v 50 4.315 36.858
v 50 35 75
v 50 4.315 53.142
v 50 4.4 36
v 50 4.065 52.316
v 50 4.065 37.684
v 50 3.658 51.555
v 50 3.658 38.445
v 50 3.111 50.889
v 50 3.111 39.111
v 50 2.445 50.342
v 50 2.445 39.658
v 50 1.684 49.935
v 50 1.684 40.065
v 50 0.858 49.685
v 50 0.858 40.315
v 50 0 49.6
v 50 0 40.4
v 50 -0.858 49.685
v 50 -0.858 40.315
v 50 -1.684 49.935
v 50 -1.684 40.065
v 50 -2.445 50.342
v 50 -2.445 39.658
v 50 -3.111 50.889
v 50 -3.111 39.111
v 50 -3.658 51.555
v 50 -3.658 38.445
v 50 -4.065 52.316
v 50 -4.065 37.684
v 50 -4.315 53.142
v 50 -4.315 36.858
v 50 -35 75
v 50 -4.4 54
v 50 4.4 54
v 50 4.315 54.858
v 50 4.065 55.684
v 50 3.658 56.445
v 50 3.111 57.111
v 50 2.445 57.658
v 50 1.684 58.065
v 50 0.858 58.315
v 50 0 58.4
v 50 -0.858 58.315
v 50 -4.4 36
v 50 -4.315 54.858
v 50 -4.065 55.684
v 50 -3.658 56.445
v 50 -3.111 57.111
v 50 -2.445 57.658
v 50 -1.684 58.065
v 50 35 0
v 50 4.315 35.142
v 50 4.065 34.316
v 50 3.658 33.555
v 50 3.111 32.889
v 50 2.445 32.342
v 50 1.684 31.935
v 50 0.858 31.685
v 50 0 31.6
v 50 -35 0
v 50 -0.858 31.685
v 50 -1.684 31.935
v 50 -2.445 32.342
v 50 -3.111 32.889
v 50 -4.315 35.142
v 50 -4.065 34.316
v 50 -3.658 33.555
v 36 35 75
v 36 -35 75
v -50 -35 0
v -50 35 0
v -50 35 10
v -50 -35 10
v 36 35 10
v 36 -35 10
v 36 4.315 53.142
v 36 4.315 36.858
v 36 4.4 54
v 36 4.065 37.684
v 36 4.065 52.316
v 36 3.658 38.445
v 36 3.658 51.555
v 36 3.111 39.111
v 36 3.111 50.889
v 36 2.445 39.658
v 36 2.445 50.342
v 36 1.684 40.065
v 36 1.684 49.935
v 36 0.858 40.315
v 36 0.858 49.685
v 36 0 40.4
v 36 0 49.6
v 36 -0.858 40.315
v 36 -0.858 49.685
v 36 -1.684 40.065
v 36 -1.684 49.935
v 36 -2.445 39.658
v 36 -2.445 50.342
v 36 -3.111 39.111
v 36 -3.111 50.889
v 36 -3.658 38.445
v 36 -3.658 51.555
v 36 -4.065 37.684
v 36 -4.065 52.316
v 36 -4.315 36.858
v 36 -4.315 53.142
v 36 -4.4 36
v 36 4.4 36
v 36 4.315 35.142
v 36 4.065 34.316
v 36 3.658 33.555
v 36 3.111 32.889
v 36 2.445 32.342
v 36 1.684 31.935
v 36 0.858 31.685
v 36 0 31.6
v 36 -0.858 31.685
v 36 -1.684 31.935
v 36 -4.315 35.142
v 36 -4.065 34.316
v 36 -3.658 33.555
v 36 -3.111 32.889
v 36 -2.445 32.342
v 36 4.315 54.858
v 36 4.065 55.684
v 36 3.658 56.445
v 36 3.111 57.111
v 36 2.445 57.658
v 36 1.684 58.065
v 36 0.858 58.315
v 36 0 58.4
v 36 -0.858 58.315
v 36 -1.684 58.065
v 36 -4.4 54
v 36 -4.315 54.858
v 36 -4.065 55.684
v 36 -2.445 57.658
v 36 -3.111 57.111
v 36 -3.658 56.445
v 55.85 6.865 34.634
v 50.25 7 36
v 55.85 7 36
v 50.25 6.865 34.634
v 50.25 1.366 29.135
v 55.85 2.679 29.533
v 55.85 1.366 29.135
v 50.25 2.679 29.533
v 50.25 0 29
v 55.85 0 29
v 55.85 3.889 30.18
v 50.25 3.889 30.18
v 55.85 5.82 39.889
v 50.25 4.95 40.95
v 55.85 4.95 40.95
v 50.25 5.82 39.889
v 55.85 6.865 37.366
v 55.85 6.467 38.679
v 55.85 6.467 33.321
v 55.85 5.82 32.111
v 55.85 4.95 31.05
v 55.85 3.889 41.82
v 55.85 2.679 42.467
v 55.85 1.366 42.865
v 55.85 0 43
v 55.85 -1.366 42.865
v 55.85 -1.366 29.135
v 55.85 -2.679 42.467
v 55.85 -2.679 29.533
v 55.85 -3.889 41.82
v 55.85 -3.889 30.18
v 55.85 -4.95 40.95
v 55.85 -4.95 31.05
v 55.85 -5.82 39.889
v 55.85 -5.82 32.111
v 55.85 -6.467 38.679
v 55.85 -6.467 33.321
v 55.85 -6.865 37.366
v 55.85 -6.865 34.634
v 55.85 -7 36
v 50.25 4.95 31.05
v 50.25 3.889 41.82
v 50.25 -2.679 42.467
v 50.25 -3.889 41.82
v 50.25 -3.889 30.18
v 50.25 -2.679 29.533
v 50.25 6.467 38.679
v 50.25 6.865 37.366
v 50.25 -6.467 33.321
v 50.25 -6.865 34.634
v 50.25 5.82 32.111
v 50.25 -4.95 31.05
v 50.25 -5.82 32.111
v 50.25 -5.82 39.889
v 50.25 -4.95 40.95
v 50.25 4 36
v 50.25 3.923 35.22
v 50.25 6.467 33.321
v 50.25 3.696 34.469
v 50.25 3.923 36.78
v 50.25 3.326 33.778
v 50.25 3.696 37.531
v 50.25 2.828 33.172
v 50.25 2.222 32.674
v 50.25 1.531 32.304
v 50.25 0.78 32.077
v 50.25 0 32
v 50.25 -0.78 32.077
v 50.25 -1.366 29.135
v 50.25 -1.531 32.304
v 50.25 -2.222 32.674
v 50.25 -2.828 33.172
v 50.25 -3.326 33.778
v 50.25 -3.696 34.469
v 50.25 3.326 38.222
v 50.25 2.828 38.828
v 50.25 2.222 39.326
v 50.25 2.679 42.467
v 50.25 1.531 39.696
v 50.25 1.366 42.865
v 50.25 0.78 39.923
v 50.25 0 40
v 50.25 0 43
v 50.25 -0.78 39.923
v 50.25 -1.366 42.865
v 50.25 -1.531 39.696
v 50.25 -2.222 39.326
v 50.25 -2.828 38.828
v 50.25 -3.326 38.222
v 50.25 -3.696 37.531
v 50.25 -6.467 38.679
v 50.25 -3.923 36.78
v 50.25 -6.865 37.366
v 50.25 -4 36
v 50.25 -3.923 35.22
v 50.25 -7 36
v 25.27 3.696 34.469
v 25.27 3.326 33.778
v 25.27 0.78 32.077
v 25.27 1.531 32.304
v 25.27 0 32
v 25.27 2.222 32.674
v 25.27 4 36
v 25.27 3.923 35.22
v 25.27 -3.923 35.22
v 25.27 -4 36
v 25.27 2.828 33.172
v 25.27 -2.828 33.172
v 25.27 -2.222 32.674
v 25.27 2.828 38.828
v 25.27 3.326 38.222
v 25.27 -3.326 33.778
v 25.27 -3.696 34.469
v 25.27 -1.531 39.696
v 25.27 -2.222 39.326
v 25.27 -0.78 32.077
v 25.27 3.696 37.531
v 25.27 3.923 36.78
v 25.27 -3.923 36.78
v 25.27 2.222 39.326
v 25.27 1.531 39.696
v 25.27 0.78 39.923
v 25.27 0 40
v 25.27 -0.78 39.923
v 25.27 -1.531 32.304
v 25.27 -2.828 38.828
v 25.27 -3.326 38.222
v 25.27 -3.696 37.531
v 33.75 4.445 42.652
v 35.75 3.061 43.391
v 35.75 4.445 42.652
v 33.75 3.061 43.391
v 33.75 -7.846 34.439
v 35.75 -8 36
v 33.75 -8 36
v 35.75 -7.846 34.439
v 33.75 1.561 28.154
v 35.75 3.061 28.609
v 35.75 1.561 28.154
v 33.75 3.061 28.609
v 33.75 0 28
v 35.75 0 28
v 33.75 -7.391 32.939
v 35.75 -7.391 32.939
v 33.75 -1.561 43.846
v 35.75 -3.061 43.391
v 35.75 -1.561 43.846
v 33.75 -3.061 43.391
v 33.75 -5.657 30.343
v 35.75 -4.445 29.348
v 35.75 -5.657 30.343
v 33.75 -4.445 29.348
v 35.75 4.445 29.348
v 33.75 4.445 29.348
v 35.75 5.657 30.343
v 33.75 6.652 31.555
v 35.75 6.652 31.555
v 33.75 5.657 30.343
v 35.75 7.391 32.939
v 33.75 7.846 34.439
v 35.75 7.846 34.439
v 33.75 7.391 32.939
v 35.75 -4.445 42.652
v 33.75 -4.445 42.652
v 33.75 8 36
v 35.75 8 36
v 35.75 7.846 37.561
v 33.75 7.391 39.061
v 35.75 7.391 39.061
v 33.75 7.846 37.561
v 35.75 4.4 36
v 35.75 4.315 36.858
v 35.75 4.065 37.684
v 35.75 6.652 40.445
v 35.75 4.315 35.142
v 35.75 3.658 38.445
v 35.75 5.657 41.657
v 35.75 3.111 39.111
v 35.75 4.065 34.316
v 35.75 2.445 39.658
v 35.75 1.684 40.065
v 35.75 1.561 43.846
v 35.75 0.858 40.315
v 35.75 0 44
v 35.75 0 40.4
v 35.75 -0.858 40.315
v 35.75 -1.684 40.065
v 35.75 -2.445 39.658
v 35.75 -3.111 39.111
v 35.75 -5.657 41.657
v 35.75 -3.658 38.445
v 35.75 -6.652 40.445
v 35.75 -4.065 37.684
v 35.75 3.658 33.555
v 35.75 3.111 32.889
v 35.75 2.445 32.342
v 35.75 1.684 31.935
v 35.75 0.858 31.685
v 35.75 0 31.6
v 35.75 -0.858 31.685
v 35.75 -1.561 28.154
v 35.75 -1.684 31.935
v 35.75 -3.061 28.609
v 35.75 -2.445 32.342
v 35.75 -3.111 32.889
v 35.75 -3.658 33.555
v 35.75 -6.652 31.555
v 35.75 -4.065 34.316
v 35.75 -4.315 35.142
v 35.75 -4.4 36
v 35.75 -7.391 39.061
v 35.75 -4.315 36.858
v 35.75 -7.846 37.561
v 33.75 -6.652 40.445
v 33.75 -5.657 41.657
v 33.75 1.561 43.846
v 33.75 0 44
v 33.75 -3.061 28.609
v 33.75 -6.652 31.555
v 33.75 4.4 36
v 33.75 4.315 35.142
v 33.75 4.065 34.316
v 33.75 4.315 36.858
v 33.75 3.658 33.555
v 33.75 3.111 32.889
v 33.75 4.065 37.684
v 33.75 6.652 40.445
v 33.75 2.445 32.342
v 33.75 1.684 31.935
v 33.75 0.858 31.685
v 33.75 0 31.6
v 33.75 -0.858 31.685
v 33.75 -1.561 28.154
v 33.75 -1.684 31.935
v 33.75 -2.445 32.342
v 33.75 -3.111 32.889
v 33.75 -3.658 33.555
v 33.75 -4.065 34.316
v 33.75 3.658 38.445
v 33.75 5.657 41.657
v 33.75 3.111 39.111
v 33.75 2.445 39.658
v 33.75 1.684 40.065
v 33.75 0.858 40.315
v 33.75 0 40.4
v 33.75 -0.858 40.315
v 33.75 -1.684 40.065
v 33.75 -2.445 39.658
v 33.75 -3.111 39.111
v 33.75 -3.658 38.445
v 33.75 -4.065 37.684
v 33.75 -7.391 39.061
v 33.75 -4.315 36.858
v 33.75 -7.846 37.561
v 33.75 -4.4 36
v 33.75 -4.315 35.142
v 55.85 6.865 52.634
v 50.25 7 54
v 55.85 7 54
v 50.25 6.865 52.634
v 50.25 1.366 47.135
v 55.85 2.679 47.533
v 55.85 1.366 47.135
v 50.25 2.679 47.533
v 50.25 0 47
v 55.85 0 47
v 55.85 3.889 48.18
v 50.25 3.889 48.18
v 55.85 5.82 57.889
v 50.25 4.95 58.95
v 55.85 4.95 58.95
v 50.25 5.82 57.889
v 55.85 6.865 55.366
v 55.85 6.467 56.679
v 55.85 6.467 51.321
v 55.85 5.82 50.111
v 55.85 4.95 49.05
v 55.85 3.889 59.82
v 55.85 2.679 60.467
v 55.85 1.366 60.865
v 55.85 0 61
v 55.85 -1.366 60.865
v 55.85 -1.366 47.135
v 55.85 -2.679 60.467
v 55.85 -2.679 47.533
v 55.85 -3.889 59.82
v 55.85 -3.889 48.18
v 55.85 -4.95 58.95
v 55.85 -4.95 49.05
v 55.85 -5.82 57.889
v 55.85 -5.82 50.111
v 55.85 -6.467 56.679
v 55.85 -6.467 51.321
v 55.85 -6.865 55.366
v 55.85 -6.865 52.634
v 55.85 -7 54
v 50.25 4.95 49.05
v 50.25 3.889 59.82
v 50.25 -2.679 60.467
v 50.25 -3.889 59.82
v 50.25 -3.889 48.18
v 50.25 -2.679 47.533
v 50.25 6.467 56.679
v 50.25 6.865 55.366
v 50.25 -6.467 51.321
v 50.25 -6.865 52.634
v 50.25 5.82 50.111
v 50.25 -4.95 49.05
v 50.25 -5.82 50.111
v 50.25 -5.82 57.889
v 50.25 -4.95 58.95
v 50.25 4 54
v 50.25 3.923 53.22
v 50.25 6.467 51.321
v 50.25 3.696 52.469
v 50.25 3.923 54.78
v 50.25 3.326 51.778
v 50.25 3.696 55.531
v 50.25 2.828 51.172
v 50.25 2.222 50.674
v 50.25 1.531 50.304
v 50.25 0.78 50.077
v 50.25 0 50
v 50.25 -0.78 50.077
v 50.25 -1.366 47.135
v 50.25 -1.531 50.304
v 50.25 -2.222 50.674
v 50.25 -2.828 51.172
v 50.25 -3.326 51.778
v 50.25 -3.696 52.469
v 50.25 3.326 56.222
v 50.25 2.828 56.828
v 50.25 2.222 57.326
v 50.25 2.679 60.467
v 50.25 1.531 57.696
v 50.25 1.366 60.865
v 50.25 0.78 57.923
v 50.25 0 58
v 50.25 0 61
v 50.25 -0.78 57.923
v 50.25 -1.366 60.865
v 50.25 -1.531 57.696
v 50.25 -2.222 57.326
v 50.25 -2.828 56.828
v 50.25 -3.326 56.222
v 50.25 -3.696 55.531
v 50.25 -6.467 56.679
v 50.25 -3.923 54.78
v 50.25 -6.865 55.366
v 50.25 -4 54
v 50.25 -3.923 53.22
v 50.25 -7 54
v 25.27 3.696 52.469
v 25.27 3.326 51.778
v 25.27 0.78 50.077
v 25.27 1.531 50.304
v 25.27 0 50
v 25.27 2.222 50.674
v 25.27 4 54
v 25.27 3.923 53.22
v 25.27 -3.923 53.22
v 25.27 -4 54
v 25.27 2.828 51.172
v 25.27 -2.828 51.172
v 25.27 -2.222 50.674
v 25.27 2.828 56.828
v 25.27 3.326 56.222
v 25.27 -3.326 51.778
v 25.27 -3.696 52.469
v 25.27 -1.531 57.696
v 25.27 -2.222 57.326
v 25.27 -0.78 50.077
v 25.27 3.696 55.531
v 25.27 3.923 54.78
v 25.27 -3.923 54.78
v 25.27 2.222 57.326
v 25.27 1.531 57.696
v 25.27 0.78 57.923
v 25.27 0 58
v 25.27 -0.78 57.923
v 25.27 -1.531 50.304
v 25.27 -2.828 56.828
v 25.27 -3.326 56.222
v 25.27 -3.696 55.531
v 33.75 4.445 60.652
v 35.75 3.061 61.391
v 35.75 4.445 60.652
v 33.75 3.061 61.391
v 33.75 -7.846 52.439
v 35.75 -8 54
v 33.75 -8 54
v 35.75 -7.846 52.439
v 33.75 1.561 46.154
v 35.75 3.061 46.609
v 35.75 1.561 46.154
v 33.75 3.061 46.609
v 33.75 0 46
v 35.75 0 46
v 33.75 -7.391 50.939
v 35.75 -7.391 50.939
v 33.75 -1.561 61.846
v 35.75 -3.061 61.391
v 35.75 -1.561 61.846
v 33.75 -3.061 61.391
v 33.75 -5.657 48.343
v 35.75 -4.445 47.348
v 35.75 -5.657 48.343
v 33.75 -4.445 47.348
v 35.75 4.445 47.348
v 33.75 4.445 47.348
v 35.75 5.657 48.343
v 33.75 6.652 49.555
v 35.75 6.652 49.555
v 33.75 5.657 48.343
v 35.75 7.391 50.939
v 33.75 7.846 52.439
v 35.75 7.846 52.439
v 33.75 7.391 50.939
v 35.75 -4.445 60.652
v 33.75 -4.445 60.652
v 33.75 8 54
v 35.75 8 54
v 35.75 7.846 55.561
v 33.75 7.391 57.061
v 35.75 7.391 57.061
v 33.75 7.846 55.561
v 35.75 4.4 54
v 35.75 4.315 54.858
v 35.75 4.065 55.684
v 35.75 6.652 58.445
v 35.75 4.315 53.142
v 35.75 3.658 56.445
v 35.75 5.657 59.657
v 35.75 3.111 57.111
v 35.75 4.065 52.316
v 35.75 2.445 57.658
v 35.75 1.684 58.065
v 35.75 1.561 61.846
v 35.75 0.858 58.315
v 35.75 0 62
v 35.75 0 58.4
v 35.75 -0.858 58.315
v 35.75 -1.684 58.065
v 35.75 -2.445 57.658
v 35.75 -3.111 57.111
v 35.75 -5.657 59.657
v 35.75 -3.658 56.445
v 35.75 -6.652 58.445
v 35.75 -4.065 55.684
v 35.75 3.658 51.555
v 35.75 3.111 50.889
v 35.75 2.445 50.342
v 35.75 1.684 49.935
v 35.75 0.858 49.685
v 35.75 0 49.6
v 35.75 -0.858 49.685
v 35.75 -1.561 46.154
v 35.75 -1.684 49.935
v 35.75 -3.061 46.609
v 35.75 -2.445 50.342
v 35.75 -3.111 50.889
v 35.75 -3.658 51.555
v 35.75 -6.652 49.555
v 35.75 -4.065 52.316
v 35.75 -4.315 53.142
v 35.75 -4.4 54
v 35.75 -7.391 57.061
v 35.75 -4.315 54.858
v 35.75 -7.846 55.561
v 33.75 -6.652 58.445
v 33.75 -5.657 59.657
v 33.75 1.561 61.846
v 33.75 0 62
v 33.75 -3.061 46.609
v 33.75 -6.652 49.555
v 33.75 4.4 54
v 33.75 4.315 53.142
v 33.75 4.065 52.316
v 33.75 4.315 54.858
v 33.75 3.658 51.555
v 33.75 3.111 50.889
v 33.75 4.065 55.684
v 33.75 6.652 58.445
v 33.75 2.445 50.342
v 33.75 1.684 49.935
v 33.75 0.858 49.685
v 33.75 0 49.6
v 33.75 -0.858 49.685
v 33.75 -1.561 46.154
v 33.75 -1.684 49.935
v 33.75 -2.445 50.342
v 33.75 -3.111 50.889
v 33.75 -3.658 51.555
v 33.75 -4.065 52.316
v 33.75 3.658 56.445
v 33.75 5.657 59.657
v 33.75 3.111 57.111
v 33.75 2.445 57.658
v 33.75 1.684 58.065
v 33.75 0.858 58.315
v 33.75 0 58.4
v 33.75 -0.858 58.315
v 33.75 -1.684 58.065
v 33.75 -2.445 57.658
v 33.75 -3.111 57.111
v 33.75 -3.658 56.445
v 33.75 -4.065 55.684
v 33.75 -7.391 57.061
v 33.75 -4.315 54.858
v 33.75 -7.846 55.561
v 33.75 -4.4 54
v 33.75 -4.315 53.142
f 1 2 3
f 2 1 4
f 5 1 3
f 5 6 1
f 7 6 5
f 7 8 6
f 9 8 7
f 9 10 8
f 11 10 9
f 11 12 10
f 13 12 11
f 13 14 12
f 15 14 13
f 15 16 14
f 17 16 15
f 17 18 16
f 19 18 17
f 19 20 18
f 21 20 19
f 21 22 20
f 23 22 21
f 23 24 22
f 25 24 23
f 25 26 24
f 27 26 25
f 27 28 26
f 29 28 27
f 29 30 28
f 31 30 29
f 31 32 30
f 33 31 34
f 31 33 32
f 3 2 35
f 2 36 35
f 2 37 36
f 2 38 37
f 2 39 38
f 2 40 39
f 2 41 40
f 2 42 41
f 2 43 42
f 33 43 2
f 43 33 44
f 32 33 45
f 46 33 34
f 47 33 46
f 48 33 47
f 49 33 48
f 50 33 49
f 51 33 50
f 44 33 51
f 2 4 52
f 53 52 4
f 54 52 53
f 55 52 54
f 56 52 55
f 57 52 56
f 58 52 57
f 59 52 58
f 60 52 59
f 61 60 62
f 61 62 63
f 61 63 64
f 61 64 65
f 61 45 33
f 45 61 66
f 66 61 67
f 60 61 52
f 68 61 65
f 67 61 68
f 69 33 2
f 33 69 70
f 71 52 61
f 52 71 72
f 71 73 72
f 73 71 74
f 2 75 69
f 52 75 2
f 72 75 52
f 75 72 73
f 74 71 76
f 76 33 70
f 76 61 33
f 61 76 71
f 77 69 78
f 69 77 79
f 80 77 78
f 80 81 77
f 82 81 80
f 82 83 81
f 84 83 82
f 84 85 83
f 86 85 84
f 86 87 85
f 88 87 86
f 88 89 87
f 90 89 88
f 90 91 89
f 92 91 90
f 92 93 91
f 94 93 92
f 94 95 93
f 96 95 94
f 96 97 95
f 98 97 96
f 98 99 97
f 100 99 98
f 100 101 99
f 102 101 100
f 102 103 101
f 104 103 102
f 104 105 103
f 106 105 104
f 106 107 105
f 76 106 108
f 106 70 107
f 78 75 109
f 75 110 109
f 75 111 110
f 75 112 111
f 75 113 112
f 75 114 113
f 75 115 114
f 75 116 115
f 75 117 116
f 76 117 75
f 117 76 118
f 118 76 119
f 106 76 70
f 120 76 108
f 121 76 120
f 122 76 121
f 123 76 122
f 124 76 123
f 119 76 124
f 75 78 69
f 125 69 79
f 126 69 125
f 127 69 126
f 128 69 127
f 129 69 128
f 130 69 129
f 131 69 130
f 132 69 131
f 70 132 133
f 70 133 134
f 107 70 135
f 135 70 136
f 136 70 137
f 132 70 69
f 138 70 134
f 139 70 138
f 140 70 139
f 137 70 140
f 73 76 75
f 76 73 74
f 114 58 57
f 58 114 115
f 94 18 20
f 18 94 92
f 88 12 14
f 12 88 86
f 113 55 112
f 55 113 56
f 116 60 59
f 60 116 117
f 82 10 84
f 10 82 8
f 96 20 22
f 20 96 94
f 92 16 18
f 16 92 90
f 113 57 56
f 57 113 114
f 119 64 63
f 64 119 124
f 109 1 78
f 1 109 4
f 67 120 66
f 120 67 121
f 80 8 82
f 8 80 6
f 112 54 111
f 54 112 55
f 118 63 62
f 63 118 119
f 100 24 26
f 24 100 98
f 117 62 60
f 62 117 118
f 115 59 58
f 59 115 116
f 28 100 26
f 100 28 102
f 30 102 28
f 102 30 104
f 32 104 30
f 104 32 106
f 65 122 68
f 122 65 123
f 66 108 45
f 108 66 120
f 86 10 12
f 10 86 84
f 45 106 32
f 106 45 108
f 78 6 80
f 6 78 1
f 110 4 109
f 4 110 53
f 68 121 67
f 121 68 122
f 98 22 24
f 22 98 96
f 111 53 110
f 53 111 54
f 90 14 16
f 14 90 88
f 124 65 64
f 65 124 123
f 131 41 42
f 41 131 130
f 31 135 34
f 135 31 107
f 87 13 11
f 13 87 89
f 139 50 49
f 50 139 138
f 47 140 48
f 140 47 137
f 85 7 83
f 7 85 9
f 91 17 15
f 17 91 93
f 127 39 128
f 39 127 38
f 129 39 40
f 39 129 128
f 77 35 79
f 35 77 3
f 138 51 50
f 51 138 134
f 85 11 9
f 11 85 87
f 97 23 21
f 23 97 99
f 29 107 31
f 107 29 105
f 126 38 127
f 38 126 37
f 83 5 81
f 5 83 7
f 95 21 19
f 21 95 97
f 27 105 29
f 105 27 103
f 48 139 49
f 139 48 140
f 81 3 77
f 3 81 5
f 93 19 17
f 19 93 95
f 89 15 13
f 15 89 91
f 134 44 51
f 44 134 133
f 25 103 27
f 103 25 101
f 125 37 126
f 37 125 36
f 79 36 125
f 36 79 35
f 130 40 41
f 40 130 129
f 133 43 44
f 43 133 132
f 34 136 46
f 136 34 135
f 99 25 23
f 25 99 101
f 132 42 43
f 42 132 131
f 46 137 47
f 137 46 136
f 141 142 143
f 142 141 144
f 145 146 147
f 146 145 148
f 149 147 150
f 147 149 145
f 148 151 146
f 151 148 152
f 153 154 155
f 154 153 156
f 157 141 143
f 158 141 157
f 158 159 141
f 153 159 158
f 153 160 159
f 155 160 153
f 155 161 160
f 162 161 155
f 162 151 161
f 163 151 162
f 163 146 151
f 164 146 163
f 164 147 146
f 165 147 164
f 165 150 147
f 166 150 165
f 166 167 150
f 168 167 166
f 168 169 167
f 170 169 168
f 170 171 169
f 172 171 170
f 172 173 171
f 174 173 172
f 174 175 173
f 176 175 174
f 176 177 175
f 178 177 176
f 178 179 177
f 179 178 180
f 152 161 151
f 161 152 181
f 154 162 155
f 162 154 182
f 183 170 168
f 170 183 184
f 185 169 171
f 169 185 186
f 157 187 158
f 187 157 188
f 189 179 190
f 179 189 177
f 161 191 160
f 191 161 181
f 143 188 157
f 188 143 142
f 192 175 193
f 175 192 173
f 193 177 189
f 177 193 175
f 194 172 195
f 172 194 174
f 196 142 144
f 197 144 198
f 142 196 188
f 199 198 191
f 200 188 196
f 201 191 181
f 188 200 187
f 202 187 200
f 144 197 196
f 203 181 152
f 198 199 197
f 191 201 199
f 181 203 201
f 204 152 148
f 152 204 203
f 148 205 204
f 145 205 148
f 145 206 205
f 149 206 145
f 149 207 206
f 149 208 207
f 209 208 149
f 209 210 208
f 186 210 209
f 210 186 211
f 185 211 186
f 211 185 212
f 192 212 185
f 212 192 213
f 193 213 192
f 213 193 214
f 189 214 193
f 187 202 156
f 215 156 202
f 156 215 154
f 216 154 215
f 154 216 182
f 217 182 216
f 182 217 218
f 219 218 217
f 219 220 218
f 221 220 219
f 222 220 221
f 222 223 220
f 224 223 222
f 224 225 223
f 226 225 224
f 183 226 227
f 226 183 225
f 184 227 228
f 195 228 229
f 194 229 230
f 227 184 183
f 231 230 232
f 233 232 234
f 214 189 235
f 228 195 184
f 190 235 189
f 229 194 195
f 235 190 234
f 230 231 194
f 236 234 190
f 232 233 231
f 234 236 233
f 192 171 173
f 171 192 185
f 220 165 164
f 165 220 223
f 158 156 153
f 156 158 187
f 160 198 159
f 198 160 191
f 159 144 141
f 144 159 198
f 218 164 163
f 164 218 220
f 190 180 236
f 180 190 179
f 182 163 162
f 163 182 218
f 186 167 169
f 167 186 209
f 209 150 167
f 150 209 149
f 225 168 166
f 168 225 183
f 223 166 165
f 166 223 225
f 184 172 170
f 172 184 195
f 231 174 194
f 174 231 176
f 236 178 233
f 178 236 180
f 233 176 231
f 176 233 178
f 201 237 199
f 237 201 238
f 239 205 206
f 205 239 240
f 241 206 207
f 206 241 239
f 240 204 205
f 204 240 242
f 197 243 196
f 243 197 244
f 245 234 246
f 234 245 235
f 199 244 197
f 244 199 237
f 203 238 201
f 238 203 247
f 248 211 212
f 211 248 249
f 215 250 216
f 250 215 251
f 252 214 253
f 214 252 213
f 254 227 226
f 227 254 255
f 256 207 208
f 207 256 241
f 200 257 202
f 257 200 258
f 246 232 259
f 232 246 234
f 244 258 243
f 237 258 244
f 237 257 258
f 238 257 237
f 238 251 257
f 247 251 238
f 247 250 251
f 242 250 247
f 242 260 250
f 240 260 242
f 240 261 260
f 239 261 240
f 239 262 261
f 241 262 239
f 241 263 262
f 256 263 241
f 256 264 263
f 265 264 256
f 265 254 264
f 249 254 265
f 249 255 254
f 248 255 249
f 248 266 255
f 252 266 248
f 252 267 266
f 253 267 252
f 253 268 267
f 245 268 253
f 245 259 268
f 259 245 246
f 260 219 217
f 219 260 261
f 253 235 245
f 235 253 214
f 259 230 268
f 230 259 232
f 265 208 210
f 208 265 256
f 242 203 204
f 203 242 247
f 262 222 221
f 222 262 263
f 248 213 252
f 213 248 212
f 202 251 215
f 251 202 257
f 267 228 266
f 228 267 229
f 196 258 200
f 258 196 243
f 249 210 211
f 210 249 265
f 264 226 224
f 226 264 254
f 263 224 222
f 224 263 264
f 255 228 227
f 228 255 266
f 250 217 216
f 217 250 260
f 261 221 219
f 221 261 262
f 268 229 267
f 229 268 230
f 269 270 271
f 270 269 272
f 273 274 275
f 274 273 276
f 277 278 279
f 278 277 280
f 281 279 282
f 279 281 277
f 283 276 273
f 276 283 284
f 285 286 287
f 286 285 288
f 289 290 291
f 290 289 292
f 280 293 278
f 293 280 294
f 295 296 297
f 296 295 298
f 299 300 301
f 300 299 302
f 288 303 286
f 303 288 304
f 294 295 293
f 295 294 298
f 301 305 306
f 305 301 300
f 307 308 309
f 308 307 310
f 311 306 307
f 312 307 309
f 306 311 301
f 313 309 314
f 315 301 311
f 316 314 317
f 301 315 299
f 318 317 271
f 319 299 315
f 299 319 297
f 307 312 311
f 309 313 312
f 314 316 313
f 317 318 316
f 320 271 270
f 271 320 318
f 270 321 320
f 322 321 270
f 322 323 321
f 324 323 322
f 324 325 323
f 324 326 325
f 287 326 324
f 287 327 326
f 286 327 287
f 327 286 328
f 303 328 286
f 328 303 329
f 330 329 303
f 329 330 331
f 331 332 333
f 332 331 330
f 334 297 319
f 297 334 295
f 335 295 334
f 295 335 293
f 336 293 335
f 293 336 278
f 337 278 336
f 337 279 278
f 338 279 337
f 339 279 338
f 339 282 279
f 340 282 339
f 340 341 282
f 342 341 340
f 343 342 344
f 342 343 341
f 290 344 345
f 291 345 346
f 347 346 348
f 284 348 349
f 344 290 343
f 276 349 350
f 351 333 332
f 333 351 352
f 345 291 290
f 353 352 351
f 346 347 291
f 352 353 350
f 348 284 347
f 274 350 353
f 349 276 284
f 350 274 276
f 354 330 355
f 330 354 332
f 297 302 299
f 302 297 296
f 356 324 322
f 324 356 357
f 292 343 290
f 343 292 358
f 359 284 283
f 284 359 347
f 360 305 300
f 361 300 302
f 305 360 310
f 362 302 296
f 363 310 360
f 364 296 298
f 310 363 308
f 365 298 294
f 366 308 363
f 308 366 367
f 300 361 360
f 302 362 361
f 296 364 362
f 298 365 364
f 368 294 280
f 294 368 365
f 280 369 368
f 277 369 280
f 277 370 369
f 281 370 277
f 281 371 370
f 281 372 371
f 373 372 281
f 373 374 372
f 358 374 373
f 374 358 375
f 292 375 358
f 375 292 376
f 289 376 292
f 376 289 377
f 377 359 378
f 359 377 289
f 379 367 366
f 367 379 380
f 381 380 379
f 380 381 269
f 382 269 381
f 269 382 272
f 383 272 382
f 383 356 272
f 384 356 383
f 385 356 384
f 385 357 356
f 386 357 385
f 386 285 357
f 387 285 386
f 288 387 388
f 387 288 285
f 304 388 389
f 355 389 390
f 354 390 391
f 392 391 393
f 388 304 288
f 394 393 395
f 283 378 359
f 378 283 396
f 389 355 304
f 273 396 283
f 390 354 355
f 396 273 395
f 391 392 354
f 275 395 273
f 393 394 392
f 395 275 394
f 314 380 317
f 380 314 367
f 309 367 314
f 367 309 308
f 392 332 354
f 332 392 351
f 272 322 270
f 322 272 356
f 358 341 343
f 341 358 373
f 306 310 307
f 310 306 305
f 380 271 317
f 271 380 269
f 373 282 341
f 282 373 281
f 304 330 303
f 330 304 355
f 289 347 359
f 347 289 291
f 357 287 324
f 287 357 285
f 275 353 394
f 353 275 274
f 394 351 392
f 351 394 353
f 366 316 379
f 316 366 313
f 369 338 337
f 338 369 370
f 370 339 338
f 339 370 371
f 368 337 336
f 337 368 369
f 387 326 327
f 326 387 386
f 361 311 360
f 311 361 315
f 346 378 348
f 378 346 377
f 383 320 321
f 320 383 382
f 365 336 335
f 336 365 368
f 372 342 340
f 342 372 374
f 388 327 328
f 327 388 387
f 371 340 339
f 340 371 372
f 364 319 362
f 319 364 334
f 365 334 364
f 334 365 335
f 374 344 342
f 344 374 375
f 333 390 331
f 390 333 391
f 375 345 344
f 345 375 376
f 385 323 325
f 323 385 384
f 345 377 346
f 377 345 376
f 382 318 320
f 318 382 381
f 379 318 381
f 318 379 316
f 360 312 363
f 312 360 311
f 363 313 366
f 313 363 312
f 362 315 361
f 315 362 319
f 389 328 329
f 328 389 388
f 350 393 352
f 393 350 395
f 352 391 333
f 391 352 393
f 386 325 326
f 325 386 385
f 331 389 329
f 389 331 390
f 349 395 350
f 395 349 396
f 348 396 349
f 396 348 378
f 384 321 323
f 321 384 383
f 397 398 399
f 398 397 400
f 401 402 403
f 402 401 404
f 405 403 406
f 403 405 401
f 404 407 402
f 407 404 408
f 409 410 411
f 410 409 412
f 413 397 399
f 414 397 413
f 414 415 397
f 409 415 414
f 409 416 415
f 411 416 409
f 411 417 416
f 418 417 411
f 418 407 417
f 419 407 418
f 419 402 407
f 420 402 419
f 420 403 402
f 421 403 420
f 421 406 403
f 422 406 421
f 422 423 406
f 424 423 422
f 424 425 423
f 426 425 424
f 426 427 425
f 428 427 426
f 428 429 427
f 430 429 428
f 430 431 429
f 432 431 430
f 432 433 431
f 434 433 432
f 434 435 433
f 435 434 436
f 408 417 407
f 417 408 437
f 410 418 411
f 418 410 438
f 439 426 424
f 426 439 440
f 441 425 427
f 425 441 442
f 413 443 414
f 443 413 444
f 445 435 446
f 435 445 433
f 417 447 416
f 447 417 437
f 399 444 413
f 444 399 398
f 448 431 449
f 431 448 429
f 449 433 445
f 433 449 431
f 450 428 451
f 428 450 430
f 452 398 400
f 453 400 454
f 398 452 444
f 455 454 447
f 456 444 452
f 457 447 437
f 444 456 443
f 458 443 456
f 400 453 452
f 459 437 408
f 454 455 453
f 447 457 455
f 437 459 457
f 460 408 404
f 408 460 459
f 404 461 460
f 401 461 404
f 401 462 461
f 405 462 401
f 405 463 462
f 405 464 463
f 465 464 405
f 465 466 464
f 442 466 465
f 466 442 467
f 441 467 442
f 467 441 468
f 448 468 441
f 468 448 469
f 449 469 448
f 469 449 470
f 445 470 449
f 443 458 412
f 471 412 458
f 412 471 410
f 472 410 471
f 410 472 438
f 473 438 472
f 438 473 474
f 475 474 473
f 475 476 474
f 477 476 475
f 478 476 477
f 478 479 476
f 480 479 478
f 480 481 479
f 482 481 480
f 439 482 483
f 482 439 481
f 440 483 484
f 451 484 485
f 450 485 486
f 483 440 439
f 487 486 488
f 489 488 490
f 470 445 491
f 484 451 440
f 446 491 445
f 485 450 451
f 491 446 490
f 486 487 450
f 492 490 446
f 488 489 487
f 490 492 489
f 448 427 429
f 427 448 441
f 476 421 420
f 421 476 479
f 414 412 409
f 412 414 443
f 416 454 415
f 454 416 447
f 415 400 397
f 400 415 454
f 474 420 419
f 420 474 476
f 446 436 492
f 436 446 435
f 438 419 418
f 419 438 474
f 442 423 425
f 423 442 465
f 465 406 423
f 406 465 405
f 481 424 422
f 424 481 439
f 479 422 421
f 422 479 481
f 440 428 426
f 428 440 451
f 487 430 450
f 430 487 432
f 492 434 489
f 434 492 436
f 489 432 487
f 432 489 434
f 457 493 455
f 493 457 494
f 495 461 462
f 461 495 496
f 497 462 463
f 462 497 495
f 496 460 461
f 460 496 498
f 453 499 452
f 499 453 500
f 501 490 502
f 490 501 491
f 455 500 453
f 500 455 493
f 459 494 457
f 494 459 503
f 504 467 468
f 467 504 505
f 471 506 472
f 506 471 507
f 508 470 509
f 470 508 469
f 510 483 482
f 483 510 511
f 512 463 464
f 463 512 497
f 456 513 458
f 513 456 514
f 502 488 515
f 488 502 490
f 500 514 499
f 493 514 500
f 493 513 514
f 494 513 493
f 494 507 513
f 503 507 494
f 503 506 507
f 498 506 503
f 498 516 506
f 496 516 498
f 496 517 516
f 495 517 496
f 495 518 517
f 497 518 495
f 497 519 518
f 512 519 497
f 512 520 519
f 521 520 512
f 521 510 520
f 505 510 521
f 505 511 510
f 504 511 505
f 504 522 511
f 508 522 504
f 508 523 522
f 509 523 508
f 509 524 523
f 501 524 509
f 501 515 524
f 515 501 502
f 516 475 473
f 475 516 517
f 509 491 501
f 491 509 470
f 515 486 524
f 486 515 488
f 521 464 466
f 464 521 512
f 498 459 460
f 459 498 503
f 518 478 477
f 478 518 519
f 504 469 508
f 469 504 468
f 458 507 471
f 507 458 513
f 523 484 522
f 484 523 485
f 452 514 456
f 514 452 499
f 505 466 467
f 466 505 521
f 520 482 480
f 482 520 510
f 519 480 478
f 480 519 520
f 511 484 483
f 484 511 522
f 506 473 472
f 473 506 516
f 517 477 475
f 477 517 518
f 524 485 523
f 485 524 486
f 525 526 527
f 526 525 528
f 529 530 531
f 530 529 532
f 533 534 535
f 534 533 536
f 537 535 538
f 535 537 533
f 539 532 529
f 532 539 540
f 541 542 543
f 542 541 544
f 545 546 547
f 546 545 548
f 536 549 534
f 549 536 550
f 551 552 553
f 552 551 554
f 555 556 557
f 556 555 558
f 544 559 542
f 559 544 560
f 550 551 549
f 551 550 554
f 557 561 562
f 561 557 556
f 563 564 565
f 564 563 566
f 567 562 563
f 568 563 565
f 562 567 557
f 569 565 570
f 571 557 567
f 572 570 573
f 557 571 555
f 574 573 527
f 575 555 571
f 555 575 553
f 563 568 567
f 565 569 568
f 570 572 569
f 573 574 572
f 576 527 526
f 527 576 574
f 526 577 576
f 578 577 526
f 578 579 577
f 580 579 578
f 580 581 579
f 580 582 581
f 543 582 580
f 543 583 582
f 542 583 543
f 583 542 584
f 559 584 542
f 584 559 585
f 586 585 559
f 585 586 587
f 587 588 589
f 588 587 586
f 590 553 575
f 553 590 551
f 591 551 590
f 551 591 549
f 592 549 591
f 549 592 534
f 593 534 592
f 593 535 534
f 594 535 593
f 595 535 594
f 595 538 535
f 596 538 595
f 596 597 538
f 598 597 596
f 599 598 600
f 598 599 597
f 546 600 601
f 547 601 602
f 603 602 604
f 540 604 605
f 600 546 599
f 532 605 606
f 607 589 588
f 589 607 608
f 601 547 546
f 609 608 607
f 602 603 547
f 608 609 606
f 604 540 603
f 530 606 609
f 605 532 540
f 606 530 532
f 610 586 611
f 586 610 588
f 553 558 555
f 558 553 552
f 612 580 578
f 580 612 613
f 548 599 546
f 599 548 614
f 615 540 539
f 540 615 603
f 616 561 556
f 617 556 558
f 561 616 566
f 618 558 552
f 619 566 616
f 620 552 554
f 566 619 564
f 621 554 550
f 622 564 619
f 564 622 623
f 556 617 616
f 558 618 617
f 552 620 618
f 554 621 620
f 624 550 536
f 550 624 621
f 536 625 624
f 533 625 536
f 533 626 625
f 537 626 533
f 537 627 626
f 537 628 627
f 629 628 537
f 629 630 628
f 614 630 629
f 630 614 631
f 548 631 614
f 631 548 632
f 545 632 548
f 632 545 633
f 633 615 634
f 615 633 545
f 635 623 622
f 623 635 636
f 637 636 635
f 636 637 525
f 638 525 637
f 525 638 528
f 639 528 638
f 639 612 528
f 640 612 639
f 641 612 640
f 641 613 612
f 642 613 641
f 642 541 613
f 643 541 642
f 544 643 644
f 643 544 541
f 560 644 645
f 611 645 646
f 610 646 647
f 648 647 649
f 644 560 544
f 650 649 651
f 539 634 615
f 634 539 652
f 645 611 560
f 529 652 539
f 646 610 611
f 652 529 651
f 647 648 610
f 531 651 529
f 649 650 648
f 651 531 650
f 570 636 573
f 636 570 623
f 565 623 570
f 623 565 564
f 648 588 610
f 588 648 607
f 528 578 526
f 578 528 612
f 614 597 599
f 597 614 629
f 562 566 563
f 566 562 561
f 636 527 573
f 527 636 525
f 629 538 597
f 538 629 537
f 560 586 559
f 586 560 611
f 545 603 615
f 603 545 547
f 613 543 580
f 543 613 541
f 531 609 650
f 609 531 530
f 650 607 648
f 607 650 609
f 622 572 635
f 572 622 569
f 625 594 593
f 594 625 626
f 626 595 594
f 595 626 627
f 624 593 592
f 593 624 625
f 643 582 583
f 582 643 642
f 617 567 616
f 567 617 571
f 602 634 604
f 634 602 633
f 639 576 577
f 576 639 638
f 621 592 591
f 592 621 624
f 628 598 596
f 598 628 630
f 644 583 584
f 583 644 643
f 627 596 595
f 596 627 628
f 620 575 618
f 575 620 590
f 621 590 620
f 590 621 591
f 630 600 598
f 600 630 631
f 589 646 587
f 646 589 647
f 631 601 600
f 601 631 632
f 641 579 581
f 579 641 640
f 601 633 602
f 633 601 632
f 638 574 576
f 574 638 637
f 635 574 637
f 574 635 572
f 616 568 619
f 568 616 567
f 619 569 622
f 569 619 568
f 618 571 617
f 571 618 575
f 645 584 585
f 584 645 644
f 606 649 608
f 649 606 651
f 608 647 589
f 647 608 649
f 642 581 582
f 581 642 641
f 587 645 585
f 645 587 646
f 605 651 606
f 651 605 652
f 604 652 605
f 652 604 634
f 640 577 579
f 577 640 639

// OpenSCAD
$fn = 32;

// ------------------------------------------------------------------------
// Bolted bracket: 100 x 70 mm bracket with 2 bolt joints
// Every part is its own module, assembly() places them once.
// ------------------------------------------------------------------------

// --- part 1 ---
module bracket() {
  difference() {
    translate([-50, -35, 0]) cube([100, 70, 75]);
    translate([-51, -36, 10]) cube([87, 72, 66]);
    translate([43, 0, 36]) rotate([0, 90, 0]) cylinder(h = 16, d = 8.8, center = true);
    translate([43, 0, 54]) rotate([0, 90, 0]) cylinder(h = 16, d = 8.8, center = true);
  }
}

// --- part 2 ---
module bolt1() {
  cylinder(h = 5.6, d = 14);
  translate([0, 0, -24.98]) cylinder(h = 24.98, d = 8);
}

// --- part 3 ---
module washer1() {
  difference() {
      translate([0, 0, 0]) cylinder(h = 2, d = 16);
      translate([0, 0, -1]) cylinder(h = 4, d = 8.8);
    }
}

// --- part 4 ---
module bolt2() {
  cylinder(h = 5.6, d = 14);
  translate([0, 0, -24.98]) cylinder(h = 24.98, d = 8);
}

// --- part 5 ---
module washer2() {
  difference() {
      translate([0, 0, 0]) cylinder(h = 2, d = 16);
      translate([0, 0, -1]) cylinder(h = 4, d = 8.8);
    }
}

// --- assembly ---
module assembly() {
  translate([0, 0, 0]) rotate([0, 0, 0]) bracket();
  translate([50.25, 0, 36]) rotate([0, 90, 0]) bolt1();
  translate([33.75, 0, 36]) rotate([0, 90, 0]) washer1();
  translate([50.25, 0, 54]) rotate([0, 90, 0]) bolt2();
  translate([33.75, 0, 54]) rotate([0, 90, 0]) washer2();
}

assembly();
